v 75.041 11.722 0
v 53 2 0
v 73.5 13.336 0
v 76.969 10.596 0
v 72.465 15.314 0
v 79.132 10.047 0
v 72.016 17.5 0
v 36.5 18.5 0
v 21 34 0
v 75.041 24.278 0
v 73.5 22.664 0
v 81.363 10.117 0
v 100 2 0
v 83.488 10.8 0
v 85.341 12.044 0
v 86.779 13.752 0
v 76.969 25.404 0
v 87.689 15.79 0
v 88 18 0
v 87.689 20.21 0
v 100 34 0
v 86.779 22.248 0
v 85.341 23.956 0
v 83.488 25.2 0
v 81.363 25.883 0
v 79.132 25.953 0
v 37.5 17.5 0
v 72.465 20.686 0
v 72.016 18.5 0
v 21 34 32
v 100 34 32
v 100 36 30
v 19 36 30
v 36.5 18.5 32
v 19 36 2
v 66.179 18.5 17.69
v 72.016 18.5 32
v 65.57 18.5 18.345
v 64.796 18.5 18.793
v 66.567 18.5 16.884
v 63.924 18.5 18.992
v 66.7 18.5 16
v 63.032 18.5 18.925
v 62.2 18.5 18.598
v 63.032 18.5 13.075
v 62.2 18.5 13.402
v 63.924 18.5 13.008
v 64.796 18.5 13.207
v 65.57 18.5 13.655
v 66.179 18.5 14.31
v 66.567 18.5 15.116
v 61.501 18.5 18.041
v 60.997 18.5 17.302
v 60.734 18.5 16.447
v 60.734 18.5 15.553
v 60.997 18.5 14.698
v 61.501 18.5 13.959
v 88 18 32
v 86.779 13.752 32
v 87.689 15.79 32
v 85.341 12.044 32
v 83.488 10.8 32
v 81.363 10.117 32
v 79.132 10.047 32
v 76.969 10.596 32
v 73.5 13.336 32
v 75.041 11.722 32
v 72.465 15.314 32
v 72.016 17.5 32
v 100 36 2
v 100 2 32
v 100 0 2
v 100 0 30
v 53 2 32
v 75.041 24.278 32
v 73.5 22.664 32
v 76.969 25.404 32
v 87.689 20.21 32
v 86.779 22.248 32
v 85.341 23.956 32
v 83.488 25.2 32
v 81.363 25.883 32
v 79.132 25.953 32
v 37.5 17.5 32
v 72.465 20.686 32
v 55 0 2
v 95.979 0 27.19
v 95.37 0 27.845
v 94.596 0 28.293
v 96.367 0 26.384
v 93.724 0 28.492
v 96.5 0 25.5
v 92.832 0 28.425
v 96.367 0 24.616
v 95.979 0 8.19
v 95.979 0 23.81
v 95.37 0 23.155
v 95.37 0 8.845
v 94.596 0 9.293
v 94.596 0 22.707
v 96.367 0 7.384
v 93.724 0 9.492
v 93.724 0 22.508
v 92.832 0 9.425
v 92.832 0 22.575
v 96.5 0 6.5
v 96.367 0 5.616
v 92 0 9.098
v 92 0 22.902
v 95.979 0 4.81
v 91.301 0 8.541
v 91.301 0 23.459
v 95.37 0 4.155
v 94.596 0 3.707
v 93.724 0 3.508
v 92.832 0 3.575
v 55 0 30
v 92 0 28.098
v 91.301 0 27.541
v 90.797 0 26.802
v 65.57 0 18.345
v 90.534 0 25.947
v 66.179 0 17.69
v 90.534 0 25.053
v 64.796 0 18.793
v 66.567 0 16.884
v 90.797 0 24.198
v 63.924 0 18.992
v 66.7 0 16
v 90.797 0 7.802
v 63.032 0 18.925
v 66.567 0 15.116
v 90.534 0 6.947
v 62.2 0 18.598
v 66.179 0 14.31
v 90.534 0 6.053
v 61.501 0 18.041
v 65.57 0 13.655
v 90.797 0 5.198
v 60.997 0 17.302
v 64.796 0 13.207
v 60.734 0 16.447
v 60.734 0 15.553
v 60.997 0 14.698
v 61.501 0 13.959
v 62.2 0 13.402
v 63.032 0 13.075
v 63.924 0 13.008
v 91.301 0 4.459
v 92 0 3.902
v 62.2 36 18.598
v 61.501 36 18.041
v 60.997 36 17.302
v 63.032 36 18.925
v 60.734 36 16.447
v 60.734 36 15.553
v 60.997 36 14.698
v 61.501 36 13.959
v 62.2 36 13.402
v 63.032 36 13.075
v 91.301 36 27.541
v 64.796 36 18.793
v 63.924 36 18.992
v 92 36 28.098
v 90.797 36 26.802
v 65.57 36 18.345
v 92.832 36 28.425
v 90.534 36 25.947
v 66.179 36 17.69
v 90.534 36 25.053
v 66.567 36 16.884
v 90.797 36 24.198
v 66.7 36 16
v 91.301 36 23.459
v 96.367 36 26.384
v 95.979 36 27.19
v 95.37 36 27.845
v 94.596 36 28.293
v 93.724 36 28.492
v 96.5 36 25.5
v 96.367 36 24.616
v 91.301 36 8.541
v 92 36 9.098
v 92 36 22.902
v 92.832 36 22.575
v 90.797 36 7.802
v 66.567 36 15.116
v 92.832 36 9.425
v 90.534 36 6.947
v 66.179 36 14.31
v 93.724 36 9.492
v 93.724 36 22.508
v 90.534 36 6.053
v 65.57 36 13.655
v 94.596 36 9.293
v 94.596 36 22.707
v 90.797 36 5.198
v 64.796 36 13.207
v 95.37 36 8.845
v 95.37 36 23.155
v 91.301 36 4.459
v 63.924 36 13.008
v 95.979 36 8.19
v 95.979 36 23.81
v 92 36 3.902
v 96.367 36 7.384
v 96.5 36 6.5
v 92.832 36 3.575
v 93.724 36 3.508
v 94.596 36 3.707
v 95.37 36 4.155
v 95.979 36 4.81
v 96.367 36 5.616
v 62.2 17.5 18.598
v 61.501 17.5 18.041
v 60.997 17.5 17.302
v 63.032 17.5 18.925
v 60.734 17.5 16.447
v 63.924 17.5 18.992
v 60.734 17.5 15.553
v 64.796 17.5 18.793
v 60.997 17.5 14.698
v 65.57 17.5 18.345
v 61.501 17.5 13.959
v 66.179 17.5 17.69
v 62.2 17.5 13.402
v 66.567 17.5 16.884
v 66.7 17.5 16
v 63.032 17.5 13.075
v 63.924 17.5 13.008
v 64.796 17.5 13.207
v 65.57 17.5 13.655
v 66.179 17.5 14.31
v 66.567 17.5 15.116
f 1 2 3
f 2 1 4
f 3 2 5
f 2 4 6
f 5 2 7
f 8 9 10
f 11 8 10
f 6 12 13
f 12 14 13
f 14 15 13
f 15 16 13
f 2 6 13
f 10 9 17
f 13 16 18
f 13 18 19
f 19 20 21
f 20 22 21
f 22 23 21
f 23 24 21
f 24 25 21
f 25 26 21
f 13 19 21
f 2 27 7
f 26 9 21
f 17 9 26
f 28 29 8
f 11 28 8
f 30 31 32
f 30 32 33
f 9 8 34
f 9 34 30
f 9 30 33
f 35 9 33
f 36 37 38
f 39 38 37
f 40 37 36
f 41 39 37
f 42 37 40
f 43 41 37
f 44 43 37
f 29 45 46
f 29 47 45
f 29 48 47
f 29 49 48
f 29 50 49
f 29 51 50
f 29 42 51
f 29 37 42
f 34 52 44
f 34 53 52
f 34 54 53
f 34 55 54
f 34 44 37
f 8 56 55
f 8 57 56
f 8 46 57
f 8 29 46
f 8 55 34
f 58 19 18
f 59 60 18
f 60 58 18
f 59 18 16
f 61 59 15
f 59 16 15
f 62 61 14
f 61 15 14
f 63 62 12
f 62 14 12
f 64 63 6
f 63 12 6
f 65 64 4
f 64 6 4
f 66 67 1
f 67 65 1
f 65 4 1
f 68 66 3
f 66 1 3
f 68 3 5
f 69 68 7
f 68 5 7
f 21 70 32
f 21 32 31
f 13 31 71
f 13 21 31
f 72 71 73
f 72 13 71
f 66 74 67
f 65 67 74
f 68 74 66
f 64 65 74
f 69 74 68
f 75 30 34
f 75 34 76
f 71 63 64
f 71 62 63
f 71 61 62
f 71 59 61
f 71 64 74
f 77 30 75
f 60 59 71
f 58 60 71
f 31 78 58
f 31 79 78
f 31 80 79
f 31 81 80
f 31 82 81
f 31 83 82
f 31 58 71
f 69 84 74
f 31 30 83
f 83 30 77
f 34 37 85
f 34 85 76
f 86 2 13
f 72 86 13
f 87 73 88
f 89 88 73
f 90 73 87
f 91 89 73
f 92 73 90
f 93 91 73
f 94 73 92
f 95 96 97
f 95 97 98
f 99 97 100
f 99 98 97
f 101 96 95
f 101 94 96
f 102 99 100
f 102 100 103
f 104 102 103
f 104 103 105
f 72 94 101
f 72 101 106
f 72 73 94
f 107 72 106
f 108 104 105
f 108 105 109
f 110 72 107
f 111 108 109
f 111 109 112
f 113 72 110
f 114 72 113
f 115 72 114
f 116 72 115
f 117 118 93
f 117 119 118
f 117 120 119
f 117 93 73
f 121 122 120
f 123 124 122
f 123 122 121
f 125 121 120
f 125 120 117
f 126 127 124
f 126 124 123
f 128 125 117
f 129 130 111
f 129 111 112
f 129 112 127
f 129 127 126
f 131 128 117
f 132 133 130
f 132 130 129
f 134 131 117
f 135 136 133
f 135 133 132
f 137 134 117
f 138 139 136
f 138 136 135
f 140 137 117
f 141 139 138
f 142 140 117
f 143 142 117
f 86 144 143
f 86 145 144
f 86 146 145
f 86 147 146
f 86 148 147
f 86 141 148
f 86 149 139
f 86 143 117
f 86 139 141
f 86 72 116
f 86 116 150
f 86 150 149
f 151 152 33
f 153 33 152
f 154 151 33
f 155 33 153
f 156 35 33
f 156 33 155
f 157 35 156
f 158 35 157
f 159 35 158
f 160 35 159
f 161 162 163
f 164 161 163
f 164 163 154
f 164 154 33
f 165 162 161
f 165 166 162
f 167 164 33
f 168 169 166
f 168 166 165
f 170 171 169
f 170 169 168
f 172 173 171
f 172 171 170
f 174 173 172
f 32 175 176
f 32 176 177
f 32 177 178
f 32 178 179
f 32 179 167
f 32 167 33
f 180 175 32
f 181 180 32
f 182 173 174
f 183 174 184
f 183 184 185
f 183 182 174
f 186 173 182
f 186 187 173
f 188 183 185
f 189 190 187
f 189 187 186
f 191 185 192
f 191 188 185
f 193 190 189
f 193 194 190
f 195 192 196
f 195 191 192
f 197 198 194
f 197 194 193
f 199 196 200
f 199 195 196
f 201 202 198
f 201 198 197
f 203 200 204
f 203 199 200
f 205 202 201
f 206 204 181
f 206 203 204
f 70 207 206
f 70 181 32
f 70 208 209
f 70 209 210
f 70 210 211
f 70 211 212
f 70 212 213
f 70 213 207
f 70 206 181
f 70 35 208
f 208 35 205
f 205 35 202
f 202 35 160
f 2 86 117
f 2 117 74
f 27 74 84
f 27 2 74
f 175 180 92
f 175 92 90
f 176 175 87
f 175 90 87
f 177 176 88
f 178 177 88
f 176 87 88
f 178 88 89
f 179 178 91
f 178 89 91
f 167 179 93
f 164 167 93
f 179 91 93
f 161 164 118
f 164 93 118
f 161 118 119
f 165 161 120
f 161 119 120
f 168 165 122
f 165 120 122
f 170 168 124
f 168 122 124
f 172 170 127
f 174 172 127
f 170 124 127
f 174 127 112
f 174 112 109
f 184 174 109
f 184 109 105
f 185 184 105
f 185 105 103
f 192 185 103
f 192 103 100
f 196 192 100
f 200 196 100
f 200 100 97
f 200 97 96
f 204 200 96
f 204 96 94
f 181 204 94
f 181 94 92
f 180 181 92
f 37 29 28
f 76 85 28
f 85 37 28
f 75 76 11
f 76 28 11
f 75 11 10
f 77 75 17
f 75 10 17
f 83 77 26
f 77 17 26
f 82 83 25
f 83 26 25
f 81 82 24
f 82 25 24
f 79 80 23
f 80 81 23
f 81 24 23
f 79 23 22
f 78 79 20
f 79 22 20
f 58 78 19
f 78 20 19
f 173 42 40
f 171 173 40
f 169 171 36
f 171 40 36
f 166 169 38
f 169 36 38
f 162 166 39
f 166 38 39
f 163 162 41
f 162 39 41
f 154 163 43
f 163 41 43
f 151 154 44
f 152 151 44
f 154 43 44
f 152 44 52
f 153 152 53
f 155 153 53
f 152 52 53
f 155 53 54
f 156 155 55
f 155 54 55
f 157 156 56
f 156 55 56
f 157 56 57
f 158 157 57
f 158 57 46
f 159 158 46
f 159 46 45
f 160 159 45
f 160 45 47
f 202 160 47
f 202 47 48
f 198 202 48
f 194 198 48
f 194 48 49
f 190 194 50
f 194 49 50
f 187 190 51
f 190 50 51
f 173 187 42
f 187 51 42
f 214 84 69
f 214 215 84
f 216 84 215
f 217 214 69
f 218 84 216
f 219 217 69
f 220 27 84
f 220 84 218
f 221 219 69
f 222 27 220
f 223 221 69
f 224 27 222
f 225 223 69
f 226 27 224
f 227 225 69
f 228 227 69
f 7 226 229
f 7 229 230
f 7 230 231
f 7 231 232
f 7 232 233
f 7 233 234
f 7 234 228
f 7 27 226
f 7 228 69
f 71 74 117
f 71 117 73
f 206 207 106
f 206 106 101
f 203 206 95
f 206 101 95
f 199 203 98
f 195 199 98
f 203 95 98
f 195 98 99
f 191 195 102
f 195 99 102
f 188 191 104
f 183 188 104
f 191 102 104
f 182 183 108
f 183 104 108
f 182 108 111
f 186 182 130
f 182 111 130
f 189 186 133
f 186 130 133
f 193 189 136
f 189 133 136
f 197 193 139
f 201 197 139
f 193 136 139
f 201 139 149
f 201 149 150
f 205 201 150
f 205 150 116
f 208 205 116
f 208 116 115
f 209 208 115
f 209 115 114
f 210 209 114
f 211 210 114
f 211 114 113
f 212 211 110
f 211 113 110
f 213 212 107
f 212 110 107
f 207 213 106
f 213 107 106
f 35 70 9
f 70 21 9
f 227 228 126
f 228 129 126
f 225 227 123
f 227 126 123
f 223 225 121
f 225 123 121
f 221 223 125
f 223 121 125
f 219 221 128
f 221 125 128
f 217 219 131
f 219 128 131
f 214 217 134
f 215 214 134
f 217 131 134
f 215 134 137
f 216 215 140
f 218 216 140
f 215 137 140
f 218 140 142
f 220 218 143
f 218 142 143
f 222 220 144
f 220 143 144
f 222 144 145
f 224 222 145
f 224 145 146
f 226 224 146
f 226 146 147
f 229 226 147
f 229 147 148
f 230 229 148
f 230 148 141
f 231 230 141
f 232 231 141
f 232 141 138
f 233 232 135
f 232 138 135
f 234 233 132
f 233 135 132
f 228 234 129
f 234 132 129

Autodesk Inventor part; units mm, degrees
ref_plane "YZ Plane" through (0, 0, 0) normal (1, 0, 0) x (0, 1, 0)
ref_plane "XZ Plane" through (0, 0, 0) normal (0, 1, 0) x (-1, 0, 0)
ref_plane "XY Plane" through (0, 0, 0) normal (0, 0, 1) x (1, 0, 0)
sketch "Sketch1" plane through (0, 0, 0) normal (0, 0, 1) x (1, 0, 0)
  line L0 (0, 2) -> (100, 2) construction
  line L1 (0, 2) -> (0, 18) construction
  line L2 (12, 18) -> (0, 18) construction
  arc A0 (12, 18) -> (28, 18) centre (20, 18) ccw construction
  line L3 (38, 18) -> (28, 18) construction
  arc A1 (38, 18) -> (62, 18) centre (50, 18) ccw construction
  line L4 (72, 18) -> (62, 18) construction
  arc A2 (72, 18) -> (88, 18) centre (80, 18) ccw construction
  line L5 (100, 18) -> (88, 18) construction
  line L6 (100, 2) -> (100, 18) construction
  line L7 (100, 34) -> (0, 34) construction
  line L8 (100, 34) -> (100, 18) construction
  line L9 (88, 18) -> (100, 18) construction
  arc A3 (88, 18) -> (72, 18) centre (80, 18) ccw construction
  line L10 (62, 18) -> (72, 18) construction
  arc A4 (62, 18) -> (38, 18) centre (50, 18) ccw construction
  line L11 (28, 18) -> (38, 18) construction
  arc A5 (28, 18) -> (12, 18) centre (20, 18) ccw construction
  line L12 (0, 18) -> (12, 18) construction
  line L13 (0, 34) -> (0, 18) construction
  line L14 (100, 2) -> (100, 0) construction
  line L15 (100, 0) -> (0, 0) construction
  line L16 (0, 0) -> (0, 2) construction
  line L17 (0, 2) -> (100, 2) construction
  line L18 (0, 34) -> (0, 36) construction
  line L19 (0, 36) -> (100, 36) construction
  line L20 (100, 36) -> (100, 34) construction
  line L21 (100, 34) -> (0, 34) construction
  line L22 (100, 36) -> (100, 0)
  line L23 (100, 0) -> (55, 0)
  line L24 (19, 36) -> (100, 36)
  circle A6 centre (80, 18) radius 8
  line L25 (72.0156, 18.5) -> (36.5, 18.5)
  line L26 (37.5, 17.5) -> (72.0156, 17.5)
  line L27 (55, 0) -> (37.5, 17.5)
  line L28 (36.5, 18.5) -> (19, 36)
  line L29 (55.9956, 18.5) -> (55.9956, 17.5) construction
  line L30 (36.5, 18.5) -> (37.5, 17.5) construction
  point P0 (55.9956, 18)
  dimension "d1" = 45
  dimension "d3" = 1
  dimension "d4" = 45
extrude "Extrusion1" add sketch "Sketch1" along normal blind 32 contours L22 L23 L27 L26 A6 L25 L28 L24
sketch "Sketch2" plane through (55, 0, 0) normal (0, -1, 0) x (1, 0, 0)
  circle A0 centre (38.5, 25.5) radius 3 projected
  circle A1 centre (38.5, 6.5) radius 3 projected
  circle A2 centre (8.7, 16) radius 3 projected
  point P0 (-55, 0)
extrude "Extrusion2" cut sketch "Sketch2" against normal through all
chamfer "Chamfer1" distance 2 angle 45 4 edges at (77.5, 0, 0) (59.5, 36, 0) (77.5, 0, 32) (59.5, 36, 32)
properties part number "AXTTS" material "PC/ABS Plastic"
